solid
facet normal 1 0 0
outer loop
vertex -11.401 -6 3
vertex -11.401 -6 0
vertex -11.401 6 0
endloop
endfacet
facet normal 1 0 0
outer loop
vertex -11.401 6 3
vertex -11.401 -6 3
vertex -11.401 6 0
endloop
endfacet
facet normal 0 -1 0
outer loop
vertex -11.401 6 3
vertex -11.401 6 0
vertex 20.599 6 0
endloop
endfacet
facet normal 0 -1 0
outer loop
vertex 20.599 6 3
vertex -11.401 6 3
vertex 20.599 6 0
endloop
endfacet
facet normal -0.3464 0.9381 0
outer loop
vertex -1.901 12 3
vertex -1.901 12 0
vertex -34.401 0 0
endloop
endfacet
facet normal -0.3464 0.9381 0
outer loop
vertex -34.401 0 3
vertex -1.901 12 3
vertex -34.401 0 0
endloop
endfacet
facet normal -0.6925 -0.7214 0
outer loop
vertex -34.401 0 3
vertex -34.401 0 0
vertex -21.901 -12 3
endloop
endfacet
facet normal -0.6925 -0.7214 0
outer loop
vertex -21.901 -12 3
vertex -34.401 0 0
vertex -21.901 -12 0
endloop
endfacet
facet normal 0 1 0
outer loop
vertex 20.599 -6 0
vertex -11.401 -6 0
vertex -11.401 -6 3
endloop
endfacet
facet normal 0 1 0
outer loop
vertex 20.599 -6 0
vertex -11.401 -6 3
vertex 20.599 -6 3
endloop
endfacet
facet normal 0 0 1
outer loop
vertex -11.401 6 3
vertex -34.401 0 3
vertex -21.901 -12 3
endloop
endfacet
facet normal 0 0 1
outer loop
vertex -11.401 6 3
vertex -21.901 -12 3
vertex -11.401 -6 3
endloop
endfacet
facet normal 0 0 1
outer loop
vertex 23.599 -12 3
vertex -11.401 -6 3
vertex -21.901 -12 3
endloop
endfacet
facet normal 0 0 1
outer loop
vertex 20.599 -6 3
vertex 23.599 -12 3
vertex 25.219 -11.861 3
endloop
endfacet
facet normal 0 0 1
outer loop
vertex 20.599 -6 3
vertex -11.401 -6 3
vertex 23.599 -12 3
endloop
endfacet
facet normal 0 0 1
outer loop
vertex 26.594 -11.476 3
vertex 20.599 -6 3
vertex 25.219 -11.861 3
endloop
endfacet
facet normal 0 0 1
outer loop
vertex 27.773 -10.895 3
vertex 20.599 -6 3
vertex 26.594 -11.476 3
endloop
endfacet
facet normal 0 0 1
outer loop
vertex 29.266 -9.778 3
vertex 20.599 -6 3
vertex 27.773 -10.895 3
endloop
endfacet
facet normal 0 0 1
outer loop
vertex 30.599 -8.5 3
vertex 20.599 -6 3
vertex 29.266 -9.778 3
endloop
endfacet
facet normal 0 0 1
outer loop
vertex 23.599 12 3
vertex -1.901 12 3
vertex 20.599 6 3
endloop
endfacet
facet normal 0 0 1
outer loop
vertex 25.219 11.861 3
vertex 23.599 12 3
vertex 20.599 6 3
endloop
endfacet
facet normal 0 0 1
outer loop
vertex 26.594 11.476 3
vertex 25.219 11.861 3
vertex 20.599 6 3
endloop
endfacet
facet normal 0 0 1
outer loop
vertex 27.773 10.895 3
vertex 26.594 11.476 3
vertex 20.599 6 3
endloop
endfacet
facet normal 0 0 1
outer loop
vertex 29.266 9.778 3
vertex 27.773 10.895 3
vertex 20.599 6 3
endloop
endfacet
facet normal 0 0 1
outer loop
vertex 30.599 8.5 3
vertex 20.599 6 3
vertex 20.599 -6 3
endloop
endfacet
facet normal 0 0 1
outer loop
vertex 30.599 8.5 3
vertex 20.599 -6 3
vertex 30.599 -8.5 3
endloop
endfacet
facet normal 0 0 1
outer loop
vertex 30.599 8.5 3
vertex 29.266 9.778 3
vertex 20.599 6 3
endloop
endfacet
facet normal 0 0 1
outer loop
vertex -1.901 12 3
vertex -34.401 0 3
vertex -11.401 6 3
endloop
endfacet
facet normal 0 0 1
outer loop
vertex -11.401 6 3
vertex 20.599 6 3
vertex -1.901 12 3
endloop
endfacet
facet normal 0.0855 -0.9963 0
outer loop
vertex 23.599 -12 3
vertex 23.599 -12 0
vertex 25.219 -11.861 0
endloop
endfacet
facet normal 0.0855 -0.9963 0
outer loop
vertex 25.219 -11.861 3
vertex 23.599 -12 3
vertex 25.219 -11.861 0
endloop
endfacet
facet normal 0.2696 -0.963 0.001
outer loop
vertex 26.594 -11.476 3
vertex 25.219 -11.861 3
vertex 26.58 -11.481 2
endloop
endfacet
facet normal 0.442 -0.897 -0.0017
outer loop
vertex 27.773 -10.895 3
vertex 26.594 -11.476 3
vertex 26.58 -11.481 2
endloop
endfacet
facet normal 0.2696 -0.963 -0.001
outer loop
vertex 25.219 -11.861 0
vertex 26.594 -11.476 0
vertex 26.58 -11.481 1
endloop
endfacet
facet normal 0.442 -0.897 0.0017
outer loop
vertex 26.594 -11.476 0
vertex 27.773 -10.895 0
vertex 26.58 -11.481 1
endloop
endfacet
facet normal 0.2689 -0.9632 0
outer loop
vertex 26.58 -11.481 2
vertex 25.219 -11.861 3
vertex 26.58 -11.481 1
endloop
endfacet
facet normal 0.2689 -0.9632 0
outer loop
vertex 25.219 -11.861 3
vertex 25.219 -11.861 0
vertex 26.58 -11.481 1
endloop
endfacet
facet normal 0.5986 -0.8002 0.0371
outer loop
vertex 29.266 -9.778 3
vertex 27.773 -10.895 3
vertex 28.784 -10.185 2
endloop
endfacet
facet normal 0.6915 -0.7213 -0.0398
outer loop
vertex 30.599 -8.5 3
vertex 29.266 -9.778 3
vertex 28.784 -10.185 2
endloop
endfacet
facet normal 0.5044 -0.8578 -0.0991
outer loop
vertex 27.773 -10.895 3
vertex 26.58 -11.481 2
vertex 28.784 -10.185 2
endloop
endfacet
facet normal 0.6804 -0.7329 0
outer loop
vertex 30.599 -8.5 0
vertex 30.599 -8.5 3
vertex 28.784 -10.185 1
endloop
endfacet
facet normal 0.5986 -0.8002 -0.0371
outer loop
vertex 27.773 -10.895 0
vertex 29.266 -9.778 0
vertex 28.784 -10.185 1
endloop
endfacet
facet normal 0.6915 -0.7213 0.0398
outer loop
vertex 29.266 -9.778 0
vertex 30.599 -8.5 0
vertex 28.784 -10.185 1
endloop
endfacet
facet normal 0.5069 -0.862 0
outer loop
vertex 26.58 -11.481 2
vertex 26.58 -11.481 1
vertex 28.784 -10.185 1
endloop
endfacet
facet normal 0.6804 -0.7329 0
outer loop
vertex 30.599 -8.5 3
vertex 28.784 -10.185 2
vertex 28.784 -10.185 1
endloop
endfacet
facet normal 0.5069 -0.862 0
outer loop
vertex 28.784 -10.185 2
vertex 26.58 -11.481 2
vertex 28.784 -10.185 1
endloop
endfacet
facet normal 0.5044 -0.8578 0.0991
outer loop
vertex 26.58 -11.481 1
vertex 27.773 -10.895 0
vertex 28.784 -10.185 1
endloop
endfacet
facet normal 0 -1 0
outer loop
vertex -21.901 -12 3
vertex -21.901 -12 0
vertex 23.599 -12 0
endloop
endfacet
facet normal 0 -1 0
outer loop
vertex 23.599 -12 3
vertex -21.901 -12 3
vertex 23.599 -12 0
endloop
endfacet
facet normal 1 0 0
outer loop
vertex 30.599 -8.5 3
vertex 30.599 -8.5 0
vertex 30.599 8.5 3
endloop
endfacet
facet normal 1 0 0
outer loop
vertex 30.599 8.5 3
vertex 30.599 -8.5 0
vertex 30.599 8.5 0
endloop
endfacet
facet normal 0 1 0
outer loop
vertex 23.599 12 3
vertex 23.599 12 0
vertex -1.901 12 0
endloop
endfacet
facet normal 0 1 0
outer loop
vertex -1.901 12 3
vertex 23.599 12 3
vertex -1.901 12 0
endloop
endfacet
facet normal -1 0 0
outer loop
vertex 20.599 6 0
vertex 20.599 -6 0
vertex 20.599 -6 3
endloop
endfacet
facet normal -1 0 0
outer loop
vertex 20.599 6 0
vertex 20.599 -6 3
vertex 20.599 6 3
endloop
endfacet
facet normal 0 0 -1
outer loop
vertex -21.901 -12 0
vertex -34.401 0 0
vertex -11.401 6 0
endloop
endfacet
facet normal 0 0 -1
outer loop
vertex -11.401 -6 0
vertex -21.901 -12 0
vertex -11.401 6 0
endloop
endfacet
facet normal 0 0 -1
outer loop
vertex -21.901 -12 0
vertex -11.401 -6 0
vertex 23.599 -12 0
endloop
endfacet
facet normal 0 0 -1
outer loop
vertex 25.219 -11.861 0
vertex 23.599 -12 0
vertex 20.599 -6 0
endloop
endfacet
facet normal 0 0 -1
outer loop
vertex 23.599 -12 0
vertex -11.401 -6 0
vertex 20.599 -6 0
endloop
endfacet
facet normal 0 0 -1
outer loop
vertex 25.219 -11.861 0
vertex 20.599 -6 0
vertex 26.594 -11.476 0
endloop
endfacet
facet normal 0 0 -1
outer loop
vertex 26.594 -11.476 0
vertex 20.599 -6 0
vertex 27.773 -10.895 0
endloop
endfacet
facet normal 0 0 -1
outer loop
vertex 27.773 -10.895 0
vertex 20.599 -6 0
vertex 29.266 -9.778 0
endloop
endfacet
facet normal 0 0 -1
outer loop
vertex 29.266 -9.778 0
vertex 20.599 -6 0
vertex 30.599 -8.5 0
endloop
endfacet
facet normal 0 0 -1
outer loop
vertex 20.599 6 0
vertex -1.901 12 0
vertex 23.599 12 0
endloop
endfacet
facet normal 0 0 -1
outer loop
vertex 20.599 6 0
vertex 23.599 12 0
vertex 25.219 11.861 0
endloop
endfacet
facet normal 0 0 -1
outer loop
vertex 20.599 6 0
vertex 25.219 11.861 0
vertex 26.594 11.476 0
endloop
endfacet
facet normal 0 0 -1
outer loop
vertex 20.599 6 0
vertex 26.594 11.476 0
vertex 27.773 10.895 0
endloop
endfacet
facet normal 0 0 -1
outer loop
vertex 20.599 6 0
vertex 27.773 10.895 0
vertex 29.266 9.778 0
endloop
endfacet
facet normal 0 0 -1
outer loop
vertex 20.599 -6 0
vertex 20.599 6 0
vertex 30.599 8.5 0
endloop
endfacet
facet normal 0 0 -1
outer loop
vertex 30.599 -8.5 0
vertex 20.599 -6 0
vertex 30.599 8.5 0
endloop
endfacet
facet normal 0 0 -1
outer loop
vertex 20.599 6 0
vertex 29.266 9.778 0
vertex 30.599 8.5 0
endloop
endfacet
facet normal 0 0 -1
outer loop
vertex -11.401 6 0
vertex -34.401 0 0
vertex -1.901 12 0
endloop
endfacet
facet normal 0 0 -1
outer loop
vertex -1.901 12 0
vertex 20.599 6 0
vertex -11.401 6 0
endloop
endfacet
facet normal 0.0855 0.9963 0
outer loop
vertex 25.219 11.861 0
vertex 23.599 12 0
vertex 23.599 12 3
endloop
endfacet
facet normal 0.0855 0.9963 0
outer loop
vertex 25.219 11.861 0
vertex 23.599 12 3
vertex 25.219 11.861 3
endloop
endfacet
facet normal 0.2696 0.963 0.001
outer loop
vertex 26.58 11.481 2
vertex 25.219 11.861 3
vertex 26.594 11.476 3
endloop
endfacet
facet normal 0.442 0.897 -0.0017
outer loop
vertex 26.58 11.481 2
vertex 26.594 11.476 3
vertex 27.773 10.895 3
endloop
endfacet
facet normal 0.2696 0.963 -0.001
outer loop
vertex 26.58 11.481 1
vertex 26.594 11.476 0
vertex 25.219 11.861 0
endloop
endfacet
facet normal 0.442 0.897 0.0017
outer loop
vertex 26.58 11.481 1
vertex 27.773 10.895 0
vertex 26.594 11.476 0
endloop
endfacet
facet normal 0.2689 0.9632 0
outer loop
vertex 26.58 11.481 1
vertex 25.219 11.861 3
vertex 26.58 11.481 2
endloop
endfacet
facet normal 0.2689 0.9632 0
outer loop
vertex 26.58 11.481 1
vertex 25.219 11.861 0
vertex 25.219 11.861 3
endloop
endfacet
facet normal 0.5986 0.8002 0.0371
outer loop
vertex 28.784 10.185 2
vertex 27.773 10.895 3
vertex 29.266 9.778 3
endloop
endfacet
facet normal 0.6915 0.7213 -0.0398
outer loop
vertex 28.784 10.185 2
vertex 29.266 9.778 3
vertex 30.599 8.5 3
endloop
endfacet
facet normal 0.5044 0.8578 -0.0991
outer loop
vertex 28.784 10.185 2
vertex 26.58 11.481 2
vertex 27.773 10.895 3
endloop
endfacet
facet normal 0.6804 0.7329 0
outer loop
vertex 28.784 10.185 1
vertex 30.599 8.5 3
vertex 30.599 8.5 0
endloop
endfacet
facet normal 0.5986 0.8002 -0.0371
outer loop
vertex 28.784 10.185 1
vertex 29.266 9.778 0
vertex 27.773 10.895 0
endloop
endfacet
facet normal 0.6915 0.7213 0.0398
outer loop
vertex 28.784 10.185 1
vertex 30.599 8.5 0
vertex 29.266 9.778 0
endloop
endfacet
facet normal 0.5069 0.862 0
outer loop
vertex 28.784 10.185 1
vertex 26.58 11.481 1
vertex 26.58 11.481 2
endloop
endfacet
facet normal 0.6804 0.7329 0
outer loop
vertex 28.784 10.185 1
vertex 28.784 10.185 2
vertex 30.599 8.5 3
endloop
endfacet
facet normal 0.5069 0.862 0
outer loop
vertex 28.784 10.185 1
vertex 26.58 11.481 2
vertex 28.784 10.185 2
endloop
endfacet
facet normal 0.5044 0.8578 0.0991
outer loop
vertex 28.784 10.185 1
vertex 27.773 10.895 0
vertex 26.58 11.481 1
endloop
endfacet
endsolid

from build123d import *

# Parameters (mm, degrees)
ESQUISSE1_W        = 32
ESQUISSE1_H        = 12
BOSS_EXTRU_1_DEPTH = 3


with BuildPart() as part:
    # Esquisse1 → Boss.-Extru.1 (new body)
    with BuildSketch(Plane.XY):
        with BuildLine():
            Line((-1.901457503, 12), (-34.401457503, 0))
            Line((-34.401457503, 0), (-21.901457503, -12))
            Line((-21.901457503, -12), (23.598542497, -12))
            add(Edge.make_bspline(
                [(23.598542497, -12), (27.098542497, -12), (28.848542497, -10.25), (30.598542497, -8.5)],
                knots=[0, 0, 0, 0, 0.5, 0.5, 0.5, 0.5], degree=3))
            Line((30.598542497, -8.5), (30.598542497, 8.5))
            add(Edge.make_bspline(
                [(23.598542497, 12), (27.098542497, 12), (28.848542497, 10.25), (30.598542497, 8.5)],
                knots=[0, 0, 0, 0, 0.5, 0.5, 0.5, 0.5], degree=3))
            Line((23.598542497, 12), (-1.901457503, 12))
        make_face()
        with Locations((4.598542497, 0)):
            Rectangle(ESQUISSE1_W, ESQUISSE1_H, mode=Mode.SUBTRACT)
    extrude(amount=BOSS_EXTRU_1_DEPTH)


solid = part.part
